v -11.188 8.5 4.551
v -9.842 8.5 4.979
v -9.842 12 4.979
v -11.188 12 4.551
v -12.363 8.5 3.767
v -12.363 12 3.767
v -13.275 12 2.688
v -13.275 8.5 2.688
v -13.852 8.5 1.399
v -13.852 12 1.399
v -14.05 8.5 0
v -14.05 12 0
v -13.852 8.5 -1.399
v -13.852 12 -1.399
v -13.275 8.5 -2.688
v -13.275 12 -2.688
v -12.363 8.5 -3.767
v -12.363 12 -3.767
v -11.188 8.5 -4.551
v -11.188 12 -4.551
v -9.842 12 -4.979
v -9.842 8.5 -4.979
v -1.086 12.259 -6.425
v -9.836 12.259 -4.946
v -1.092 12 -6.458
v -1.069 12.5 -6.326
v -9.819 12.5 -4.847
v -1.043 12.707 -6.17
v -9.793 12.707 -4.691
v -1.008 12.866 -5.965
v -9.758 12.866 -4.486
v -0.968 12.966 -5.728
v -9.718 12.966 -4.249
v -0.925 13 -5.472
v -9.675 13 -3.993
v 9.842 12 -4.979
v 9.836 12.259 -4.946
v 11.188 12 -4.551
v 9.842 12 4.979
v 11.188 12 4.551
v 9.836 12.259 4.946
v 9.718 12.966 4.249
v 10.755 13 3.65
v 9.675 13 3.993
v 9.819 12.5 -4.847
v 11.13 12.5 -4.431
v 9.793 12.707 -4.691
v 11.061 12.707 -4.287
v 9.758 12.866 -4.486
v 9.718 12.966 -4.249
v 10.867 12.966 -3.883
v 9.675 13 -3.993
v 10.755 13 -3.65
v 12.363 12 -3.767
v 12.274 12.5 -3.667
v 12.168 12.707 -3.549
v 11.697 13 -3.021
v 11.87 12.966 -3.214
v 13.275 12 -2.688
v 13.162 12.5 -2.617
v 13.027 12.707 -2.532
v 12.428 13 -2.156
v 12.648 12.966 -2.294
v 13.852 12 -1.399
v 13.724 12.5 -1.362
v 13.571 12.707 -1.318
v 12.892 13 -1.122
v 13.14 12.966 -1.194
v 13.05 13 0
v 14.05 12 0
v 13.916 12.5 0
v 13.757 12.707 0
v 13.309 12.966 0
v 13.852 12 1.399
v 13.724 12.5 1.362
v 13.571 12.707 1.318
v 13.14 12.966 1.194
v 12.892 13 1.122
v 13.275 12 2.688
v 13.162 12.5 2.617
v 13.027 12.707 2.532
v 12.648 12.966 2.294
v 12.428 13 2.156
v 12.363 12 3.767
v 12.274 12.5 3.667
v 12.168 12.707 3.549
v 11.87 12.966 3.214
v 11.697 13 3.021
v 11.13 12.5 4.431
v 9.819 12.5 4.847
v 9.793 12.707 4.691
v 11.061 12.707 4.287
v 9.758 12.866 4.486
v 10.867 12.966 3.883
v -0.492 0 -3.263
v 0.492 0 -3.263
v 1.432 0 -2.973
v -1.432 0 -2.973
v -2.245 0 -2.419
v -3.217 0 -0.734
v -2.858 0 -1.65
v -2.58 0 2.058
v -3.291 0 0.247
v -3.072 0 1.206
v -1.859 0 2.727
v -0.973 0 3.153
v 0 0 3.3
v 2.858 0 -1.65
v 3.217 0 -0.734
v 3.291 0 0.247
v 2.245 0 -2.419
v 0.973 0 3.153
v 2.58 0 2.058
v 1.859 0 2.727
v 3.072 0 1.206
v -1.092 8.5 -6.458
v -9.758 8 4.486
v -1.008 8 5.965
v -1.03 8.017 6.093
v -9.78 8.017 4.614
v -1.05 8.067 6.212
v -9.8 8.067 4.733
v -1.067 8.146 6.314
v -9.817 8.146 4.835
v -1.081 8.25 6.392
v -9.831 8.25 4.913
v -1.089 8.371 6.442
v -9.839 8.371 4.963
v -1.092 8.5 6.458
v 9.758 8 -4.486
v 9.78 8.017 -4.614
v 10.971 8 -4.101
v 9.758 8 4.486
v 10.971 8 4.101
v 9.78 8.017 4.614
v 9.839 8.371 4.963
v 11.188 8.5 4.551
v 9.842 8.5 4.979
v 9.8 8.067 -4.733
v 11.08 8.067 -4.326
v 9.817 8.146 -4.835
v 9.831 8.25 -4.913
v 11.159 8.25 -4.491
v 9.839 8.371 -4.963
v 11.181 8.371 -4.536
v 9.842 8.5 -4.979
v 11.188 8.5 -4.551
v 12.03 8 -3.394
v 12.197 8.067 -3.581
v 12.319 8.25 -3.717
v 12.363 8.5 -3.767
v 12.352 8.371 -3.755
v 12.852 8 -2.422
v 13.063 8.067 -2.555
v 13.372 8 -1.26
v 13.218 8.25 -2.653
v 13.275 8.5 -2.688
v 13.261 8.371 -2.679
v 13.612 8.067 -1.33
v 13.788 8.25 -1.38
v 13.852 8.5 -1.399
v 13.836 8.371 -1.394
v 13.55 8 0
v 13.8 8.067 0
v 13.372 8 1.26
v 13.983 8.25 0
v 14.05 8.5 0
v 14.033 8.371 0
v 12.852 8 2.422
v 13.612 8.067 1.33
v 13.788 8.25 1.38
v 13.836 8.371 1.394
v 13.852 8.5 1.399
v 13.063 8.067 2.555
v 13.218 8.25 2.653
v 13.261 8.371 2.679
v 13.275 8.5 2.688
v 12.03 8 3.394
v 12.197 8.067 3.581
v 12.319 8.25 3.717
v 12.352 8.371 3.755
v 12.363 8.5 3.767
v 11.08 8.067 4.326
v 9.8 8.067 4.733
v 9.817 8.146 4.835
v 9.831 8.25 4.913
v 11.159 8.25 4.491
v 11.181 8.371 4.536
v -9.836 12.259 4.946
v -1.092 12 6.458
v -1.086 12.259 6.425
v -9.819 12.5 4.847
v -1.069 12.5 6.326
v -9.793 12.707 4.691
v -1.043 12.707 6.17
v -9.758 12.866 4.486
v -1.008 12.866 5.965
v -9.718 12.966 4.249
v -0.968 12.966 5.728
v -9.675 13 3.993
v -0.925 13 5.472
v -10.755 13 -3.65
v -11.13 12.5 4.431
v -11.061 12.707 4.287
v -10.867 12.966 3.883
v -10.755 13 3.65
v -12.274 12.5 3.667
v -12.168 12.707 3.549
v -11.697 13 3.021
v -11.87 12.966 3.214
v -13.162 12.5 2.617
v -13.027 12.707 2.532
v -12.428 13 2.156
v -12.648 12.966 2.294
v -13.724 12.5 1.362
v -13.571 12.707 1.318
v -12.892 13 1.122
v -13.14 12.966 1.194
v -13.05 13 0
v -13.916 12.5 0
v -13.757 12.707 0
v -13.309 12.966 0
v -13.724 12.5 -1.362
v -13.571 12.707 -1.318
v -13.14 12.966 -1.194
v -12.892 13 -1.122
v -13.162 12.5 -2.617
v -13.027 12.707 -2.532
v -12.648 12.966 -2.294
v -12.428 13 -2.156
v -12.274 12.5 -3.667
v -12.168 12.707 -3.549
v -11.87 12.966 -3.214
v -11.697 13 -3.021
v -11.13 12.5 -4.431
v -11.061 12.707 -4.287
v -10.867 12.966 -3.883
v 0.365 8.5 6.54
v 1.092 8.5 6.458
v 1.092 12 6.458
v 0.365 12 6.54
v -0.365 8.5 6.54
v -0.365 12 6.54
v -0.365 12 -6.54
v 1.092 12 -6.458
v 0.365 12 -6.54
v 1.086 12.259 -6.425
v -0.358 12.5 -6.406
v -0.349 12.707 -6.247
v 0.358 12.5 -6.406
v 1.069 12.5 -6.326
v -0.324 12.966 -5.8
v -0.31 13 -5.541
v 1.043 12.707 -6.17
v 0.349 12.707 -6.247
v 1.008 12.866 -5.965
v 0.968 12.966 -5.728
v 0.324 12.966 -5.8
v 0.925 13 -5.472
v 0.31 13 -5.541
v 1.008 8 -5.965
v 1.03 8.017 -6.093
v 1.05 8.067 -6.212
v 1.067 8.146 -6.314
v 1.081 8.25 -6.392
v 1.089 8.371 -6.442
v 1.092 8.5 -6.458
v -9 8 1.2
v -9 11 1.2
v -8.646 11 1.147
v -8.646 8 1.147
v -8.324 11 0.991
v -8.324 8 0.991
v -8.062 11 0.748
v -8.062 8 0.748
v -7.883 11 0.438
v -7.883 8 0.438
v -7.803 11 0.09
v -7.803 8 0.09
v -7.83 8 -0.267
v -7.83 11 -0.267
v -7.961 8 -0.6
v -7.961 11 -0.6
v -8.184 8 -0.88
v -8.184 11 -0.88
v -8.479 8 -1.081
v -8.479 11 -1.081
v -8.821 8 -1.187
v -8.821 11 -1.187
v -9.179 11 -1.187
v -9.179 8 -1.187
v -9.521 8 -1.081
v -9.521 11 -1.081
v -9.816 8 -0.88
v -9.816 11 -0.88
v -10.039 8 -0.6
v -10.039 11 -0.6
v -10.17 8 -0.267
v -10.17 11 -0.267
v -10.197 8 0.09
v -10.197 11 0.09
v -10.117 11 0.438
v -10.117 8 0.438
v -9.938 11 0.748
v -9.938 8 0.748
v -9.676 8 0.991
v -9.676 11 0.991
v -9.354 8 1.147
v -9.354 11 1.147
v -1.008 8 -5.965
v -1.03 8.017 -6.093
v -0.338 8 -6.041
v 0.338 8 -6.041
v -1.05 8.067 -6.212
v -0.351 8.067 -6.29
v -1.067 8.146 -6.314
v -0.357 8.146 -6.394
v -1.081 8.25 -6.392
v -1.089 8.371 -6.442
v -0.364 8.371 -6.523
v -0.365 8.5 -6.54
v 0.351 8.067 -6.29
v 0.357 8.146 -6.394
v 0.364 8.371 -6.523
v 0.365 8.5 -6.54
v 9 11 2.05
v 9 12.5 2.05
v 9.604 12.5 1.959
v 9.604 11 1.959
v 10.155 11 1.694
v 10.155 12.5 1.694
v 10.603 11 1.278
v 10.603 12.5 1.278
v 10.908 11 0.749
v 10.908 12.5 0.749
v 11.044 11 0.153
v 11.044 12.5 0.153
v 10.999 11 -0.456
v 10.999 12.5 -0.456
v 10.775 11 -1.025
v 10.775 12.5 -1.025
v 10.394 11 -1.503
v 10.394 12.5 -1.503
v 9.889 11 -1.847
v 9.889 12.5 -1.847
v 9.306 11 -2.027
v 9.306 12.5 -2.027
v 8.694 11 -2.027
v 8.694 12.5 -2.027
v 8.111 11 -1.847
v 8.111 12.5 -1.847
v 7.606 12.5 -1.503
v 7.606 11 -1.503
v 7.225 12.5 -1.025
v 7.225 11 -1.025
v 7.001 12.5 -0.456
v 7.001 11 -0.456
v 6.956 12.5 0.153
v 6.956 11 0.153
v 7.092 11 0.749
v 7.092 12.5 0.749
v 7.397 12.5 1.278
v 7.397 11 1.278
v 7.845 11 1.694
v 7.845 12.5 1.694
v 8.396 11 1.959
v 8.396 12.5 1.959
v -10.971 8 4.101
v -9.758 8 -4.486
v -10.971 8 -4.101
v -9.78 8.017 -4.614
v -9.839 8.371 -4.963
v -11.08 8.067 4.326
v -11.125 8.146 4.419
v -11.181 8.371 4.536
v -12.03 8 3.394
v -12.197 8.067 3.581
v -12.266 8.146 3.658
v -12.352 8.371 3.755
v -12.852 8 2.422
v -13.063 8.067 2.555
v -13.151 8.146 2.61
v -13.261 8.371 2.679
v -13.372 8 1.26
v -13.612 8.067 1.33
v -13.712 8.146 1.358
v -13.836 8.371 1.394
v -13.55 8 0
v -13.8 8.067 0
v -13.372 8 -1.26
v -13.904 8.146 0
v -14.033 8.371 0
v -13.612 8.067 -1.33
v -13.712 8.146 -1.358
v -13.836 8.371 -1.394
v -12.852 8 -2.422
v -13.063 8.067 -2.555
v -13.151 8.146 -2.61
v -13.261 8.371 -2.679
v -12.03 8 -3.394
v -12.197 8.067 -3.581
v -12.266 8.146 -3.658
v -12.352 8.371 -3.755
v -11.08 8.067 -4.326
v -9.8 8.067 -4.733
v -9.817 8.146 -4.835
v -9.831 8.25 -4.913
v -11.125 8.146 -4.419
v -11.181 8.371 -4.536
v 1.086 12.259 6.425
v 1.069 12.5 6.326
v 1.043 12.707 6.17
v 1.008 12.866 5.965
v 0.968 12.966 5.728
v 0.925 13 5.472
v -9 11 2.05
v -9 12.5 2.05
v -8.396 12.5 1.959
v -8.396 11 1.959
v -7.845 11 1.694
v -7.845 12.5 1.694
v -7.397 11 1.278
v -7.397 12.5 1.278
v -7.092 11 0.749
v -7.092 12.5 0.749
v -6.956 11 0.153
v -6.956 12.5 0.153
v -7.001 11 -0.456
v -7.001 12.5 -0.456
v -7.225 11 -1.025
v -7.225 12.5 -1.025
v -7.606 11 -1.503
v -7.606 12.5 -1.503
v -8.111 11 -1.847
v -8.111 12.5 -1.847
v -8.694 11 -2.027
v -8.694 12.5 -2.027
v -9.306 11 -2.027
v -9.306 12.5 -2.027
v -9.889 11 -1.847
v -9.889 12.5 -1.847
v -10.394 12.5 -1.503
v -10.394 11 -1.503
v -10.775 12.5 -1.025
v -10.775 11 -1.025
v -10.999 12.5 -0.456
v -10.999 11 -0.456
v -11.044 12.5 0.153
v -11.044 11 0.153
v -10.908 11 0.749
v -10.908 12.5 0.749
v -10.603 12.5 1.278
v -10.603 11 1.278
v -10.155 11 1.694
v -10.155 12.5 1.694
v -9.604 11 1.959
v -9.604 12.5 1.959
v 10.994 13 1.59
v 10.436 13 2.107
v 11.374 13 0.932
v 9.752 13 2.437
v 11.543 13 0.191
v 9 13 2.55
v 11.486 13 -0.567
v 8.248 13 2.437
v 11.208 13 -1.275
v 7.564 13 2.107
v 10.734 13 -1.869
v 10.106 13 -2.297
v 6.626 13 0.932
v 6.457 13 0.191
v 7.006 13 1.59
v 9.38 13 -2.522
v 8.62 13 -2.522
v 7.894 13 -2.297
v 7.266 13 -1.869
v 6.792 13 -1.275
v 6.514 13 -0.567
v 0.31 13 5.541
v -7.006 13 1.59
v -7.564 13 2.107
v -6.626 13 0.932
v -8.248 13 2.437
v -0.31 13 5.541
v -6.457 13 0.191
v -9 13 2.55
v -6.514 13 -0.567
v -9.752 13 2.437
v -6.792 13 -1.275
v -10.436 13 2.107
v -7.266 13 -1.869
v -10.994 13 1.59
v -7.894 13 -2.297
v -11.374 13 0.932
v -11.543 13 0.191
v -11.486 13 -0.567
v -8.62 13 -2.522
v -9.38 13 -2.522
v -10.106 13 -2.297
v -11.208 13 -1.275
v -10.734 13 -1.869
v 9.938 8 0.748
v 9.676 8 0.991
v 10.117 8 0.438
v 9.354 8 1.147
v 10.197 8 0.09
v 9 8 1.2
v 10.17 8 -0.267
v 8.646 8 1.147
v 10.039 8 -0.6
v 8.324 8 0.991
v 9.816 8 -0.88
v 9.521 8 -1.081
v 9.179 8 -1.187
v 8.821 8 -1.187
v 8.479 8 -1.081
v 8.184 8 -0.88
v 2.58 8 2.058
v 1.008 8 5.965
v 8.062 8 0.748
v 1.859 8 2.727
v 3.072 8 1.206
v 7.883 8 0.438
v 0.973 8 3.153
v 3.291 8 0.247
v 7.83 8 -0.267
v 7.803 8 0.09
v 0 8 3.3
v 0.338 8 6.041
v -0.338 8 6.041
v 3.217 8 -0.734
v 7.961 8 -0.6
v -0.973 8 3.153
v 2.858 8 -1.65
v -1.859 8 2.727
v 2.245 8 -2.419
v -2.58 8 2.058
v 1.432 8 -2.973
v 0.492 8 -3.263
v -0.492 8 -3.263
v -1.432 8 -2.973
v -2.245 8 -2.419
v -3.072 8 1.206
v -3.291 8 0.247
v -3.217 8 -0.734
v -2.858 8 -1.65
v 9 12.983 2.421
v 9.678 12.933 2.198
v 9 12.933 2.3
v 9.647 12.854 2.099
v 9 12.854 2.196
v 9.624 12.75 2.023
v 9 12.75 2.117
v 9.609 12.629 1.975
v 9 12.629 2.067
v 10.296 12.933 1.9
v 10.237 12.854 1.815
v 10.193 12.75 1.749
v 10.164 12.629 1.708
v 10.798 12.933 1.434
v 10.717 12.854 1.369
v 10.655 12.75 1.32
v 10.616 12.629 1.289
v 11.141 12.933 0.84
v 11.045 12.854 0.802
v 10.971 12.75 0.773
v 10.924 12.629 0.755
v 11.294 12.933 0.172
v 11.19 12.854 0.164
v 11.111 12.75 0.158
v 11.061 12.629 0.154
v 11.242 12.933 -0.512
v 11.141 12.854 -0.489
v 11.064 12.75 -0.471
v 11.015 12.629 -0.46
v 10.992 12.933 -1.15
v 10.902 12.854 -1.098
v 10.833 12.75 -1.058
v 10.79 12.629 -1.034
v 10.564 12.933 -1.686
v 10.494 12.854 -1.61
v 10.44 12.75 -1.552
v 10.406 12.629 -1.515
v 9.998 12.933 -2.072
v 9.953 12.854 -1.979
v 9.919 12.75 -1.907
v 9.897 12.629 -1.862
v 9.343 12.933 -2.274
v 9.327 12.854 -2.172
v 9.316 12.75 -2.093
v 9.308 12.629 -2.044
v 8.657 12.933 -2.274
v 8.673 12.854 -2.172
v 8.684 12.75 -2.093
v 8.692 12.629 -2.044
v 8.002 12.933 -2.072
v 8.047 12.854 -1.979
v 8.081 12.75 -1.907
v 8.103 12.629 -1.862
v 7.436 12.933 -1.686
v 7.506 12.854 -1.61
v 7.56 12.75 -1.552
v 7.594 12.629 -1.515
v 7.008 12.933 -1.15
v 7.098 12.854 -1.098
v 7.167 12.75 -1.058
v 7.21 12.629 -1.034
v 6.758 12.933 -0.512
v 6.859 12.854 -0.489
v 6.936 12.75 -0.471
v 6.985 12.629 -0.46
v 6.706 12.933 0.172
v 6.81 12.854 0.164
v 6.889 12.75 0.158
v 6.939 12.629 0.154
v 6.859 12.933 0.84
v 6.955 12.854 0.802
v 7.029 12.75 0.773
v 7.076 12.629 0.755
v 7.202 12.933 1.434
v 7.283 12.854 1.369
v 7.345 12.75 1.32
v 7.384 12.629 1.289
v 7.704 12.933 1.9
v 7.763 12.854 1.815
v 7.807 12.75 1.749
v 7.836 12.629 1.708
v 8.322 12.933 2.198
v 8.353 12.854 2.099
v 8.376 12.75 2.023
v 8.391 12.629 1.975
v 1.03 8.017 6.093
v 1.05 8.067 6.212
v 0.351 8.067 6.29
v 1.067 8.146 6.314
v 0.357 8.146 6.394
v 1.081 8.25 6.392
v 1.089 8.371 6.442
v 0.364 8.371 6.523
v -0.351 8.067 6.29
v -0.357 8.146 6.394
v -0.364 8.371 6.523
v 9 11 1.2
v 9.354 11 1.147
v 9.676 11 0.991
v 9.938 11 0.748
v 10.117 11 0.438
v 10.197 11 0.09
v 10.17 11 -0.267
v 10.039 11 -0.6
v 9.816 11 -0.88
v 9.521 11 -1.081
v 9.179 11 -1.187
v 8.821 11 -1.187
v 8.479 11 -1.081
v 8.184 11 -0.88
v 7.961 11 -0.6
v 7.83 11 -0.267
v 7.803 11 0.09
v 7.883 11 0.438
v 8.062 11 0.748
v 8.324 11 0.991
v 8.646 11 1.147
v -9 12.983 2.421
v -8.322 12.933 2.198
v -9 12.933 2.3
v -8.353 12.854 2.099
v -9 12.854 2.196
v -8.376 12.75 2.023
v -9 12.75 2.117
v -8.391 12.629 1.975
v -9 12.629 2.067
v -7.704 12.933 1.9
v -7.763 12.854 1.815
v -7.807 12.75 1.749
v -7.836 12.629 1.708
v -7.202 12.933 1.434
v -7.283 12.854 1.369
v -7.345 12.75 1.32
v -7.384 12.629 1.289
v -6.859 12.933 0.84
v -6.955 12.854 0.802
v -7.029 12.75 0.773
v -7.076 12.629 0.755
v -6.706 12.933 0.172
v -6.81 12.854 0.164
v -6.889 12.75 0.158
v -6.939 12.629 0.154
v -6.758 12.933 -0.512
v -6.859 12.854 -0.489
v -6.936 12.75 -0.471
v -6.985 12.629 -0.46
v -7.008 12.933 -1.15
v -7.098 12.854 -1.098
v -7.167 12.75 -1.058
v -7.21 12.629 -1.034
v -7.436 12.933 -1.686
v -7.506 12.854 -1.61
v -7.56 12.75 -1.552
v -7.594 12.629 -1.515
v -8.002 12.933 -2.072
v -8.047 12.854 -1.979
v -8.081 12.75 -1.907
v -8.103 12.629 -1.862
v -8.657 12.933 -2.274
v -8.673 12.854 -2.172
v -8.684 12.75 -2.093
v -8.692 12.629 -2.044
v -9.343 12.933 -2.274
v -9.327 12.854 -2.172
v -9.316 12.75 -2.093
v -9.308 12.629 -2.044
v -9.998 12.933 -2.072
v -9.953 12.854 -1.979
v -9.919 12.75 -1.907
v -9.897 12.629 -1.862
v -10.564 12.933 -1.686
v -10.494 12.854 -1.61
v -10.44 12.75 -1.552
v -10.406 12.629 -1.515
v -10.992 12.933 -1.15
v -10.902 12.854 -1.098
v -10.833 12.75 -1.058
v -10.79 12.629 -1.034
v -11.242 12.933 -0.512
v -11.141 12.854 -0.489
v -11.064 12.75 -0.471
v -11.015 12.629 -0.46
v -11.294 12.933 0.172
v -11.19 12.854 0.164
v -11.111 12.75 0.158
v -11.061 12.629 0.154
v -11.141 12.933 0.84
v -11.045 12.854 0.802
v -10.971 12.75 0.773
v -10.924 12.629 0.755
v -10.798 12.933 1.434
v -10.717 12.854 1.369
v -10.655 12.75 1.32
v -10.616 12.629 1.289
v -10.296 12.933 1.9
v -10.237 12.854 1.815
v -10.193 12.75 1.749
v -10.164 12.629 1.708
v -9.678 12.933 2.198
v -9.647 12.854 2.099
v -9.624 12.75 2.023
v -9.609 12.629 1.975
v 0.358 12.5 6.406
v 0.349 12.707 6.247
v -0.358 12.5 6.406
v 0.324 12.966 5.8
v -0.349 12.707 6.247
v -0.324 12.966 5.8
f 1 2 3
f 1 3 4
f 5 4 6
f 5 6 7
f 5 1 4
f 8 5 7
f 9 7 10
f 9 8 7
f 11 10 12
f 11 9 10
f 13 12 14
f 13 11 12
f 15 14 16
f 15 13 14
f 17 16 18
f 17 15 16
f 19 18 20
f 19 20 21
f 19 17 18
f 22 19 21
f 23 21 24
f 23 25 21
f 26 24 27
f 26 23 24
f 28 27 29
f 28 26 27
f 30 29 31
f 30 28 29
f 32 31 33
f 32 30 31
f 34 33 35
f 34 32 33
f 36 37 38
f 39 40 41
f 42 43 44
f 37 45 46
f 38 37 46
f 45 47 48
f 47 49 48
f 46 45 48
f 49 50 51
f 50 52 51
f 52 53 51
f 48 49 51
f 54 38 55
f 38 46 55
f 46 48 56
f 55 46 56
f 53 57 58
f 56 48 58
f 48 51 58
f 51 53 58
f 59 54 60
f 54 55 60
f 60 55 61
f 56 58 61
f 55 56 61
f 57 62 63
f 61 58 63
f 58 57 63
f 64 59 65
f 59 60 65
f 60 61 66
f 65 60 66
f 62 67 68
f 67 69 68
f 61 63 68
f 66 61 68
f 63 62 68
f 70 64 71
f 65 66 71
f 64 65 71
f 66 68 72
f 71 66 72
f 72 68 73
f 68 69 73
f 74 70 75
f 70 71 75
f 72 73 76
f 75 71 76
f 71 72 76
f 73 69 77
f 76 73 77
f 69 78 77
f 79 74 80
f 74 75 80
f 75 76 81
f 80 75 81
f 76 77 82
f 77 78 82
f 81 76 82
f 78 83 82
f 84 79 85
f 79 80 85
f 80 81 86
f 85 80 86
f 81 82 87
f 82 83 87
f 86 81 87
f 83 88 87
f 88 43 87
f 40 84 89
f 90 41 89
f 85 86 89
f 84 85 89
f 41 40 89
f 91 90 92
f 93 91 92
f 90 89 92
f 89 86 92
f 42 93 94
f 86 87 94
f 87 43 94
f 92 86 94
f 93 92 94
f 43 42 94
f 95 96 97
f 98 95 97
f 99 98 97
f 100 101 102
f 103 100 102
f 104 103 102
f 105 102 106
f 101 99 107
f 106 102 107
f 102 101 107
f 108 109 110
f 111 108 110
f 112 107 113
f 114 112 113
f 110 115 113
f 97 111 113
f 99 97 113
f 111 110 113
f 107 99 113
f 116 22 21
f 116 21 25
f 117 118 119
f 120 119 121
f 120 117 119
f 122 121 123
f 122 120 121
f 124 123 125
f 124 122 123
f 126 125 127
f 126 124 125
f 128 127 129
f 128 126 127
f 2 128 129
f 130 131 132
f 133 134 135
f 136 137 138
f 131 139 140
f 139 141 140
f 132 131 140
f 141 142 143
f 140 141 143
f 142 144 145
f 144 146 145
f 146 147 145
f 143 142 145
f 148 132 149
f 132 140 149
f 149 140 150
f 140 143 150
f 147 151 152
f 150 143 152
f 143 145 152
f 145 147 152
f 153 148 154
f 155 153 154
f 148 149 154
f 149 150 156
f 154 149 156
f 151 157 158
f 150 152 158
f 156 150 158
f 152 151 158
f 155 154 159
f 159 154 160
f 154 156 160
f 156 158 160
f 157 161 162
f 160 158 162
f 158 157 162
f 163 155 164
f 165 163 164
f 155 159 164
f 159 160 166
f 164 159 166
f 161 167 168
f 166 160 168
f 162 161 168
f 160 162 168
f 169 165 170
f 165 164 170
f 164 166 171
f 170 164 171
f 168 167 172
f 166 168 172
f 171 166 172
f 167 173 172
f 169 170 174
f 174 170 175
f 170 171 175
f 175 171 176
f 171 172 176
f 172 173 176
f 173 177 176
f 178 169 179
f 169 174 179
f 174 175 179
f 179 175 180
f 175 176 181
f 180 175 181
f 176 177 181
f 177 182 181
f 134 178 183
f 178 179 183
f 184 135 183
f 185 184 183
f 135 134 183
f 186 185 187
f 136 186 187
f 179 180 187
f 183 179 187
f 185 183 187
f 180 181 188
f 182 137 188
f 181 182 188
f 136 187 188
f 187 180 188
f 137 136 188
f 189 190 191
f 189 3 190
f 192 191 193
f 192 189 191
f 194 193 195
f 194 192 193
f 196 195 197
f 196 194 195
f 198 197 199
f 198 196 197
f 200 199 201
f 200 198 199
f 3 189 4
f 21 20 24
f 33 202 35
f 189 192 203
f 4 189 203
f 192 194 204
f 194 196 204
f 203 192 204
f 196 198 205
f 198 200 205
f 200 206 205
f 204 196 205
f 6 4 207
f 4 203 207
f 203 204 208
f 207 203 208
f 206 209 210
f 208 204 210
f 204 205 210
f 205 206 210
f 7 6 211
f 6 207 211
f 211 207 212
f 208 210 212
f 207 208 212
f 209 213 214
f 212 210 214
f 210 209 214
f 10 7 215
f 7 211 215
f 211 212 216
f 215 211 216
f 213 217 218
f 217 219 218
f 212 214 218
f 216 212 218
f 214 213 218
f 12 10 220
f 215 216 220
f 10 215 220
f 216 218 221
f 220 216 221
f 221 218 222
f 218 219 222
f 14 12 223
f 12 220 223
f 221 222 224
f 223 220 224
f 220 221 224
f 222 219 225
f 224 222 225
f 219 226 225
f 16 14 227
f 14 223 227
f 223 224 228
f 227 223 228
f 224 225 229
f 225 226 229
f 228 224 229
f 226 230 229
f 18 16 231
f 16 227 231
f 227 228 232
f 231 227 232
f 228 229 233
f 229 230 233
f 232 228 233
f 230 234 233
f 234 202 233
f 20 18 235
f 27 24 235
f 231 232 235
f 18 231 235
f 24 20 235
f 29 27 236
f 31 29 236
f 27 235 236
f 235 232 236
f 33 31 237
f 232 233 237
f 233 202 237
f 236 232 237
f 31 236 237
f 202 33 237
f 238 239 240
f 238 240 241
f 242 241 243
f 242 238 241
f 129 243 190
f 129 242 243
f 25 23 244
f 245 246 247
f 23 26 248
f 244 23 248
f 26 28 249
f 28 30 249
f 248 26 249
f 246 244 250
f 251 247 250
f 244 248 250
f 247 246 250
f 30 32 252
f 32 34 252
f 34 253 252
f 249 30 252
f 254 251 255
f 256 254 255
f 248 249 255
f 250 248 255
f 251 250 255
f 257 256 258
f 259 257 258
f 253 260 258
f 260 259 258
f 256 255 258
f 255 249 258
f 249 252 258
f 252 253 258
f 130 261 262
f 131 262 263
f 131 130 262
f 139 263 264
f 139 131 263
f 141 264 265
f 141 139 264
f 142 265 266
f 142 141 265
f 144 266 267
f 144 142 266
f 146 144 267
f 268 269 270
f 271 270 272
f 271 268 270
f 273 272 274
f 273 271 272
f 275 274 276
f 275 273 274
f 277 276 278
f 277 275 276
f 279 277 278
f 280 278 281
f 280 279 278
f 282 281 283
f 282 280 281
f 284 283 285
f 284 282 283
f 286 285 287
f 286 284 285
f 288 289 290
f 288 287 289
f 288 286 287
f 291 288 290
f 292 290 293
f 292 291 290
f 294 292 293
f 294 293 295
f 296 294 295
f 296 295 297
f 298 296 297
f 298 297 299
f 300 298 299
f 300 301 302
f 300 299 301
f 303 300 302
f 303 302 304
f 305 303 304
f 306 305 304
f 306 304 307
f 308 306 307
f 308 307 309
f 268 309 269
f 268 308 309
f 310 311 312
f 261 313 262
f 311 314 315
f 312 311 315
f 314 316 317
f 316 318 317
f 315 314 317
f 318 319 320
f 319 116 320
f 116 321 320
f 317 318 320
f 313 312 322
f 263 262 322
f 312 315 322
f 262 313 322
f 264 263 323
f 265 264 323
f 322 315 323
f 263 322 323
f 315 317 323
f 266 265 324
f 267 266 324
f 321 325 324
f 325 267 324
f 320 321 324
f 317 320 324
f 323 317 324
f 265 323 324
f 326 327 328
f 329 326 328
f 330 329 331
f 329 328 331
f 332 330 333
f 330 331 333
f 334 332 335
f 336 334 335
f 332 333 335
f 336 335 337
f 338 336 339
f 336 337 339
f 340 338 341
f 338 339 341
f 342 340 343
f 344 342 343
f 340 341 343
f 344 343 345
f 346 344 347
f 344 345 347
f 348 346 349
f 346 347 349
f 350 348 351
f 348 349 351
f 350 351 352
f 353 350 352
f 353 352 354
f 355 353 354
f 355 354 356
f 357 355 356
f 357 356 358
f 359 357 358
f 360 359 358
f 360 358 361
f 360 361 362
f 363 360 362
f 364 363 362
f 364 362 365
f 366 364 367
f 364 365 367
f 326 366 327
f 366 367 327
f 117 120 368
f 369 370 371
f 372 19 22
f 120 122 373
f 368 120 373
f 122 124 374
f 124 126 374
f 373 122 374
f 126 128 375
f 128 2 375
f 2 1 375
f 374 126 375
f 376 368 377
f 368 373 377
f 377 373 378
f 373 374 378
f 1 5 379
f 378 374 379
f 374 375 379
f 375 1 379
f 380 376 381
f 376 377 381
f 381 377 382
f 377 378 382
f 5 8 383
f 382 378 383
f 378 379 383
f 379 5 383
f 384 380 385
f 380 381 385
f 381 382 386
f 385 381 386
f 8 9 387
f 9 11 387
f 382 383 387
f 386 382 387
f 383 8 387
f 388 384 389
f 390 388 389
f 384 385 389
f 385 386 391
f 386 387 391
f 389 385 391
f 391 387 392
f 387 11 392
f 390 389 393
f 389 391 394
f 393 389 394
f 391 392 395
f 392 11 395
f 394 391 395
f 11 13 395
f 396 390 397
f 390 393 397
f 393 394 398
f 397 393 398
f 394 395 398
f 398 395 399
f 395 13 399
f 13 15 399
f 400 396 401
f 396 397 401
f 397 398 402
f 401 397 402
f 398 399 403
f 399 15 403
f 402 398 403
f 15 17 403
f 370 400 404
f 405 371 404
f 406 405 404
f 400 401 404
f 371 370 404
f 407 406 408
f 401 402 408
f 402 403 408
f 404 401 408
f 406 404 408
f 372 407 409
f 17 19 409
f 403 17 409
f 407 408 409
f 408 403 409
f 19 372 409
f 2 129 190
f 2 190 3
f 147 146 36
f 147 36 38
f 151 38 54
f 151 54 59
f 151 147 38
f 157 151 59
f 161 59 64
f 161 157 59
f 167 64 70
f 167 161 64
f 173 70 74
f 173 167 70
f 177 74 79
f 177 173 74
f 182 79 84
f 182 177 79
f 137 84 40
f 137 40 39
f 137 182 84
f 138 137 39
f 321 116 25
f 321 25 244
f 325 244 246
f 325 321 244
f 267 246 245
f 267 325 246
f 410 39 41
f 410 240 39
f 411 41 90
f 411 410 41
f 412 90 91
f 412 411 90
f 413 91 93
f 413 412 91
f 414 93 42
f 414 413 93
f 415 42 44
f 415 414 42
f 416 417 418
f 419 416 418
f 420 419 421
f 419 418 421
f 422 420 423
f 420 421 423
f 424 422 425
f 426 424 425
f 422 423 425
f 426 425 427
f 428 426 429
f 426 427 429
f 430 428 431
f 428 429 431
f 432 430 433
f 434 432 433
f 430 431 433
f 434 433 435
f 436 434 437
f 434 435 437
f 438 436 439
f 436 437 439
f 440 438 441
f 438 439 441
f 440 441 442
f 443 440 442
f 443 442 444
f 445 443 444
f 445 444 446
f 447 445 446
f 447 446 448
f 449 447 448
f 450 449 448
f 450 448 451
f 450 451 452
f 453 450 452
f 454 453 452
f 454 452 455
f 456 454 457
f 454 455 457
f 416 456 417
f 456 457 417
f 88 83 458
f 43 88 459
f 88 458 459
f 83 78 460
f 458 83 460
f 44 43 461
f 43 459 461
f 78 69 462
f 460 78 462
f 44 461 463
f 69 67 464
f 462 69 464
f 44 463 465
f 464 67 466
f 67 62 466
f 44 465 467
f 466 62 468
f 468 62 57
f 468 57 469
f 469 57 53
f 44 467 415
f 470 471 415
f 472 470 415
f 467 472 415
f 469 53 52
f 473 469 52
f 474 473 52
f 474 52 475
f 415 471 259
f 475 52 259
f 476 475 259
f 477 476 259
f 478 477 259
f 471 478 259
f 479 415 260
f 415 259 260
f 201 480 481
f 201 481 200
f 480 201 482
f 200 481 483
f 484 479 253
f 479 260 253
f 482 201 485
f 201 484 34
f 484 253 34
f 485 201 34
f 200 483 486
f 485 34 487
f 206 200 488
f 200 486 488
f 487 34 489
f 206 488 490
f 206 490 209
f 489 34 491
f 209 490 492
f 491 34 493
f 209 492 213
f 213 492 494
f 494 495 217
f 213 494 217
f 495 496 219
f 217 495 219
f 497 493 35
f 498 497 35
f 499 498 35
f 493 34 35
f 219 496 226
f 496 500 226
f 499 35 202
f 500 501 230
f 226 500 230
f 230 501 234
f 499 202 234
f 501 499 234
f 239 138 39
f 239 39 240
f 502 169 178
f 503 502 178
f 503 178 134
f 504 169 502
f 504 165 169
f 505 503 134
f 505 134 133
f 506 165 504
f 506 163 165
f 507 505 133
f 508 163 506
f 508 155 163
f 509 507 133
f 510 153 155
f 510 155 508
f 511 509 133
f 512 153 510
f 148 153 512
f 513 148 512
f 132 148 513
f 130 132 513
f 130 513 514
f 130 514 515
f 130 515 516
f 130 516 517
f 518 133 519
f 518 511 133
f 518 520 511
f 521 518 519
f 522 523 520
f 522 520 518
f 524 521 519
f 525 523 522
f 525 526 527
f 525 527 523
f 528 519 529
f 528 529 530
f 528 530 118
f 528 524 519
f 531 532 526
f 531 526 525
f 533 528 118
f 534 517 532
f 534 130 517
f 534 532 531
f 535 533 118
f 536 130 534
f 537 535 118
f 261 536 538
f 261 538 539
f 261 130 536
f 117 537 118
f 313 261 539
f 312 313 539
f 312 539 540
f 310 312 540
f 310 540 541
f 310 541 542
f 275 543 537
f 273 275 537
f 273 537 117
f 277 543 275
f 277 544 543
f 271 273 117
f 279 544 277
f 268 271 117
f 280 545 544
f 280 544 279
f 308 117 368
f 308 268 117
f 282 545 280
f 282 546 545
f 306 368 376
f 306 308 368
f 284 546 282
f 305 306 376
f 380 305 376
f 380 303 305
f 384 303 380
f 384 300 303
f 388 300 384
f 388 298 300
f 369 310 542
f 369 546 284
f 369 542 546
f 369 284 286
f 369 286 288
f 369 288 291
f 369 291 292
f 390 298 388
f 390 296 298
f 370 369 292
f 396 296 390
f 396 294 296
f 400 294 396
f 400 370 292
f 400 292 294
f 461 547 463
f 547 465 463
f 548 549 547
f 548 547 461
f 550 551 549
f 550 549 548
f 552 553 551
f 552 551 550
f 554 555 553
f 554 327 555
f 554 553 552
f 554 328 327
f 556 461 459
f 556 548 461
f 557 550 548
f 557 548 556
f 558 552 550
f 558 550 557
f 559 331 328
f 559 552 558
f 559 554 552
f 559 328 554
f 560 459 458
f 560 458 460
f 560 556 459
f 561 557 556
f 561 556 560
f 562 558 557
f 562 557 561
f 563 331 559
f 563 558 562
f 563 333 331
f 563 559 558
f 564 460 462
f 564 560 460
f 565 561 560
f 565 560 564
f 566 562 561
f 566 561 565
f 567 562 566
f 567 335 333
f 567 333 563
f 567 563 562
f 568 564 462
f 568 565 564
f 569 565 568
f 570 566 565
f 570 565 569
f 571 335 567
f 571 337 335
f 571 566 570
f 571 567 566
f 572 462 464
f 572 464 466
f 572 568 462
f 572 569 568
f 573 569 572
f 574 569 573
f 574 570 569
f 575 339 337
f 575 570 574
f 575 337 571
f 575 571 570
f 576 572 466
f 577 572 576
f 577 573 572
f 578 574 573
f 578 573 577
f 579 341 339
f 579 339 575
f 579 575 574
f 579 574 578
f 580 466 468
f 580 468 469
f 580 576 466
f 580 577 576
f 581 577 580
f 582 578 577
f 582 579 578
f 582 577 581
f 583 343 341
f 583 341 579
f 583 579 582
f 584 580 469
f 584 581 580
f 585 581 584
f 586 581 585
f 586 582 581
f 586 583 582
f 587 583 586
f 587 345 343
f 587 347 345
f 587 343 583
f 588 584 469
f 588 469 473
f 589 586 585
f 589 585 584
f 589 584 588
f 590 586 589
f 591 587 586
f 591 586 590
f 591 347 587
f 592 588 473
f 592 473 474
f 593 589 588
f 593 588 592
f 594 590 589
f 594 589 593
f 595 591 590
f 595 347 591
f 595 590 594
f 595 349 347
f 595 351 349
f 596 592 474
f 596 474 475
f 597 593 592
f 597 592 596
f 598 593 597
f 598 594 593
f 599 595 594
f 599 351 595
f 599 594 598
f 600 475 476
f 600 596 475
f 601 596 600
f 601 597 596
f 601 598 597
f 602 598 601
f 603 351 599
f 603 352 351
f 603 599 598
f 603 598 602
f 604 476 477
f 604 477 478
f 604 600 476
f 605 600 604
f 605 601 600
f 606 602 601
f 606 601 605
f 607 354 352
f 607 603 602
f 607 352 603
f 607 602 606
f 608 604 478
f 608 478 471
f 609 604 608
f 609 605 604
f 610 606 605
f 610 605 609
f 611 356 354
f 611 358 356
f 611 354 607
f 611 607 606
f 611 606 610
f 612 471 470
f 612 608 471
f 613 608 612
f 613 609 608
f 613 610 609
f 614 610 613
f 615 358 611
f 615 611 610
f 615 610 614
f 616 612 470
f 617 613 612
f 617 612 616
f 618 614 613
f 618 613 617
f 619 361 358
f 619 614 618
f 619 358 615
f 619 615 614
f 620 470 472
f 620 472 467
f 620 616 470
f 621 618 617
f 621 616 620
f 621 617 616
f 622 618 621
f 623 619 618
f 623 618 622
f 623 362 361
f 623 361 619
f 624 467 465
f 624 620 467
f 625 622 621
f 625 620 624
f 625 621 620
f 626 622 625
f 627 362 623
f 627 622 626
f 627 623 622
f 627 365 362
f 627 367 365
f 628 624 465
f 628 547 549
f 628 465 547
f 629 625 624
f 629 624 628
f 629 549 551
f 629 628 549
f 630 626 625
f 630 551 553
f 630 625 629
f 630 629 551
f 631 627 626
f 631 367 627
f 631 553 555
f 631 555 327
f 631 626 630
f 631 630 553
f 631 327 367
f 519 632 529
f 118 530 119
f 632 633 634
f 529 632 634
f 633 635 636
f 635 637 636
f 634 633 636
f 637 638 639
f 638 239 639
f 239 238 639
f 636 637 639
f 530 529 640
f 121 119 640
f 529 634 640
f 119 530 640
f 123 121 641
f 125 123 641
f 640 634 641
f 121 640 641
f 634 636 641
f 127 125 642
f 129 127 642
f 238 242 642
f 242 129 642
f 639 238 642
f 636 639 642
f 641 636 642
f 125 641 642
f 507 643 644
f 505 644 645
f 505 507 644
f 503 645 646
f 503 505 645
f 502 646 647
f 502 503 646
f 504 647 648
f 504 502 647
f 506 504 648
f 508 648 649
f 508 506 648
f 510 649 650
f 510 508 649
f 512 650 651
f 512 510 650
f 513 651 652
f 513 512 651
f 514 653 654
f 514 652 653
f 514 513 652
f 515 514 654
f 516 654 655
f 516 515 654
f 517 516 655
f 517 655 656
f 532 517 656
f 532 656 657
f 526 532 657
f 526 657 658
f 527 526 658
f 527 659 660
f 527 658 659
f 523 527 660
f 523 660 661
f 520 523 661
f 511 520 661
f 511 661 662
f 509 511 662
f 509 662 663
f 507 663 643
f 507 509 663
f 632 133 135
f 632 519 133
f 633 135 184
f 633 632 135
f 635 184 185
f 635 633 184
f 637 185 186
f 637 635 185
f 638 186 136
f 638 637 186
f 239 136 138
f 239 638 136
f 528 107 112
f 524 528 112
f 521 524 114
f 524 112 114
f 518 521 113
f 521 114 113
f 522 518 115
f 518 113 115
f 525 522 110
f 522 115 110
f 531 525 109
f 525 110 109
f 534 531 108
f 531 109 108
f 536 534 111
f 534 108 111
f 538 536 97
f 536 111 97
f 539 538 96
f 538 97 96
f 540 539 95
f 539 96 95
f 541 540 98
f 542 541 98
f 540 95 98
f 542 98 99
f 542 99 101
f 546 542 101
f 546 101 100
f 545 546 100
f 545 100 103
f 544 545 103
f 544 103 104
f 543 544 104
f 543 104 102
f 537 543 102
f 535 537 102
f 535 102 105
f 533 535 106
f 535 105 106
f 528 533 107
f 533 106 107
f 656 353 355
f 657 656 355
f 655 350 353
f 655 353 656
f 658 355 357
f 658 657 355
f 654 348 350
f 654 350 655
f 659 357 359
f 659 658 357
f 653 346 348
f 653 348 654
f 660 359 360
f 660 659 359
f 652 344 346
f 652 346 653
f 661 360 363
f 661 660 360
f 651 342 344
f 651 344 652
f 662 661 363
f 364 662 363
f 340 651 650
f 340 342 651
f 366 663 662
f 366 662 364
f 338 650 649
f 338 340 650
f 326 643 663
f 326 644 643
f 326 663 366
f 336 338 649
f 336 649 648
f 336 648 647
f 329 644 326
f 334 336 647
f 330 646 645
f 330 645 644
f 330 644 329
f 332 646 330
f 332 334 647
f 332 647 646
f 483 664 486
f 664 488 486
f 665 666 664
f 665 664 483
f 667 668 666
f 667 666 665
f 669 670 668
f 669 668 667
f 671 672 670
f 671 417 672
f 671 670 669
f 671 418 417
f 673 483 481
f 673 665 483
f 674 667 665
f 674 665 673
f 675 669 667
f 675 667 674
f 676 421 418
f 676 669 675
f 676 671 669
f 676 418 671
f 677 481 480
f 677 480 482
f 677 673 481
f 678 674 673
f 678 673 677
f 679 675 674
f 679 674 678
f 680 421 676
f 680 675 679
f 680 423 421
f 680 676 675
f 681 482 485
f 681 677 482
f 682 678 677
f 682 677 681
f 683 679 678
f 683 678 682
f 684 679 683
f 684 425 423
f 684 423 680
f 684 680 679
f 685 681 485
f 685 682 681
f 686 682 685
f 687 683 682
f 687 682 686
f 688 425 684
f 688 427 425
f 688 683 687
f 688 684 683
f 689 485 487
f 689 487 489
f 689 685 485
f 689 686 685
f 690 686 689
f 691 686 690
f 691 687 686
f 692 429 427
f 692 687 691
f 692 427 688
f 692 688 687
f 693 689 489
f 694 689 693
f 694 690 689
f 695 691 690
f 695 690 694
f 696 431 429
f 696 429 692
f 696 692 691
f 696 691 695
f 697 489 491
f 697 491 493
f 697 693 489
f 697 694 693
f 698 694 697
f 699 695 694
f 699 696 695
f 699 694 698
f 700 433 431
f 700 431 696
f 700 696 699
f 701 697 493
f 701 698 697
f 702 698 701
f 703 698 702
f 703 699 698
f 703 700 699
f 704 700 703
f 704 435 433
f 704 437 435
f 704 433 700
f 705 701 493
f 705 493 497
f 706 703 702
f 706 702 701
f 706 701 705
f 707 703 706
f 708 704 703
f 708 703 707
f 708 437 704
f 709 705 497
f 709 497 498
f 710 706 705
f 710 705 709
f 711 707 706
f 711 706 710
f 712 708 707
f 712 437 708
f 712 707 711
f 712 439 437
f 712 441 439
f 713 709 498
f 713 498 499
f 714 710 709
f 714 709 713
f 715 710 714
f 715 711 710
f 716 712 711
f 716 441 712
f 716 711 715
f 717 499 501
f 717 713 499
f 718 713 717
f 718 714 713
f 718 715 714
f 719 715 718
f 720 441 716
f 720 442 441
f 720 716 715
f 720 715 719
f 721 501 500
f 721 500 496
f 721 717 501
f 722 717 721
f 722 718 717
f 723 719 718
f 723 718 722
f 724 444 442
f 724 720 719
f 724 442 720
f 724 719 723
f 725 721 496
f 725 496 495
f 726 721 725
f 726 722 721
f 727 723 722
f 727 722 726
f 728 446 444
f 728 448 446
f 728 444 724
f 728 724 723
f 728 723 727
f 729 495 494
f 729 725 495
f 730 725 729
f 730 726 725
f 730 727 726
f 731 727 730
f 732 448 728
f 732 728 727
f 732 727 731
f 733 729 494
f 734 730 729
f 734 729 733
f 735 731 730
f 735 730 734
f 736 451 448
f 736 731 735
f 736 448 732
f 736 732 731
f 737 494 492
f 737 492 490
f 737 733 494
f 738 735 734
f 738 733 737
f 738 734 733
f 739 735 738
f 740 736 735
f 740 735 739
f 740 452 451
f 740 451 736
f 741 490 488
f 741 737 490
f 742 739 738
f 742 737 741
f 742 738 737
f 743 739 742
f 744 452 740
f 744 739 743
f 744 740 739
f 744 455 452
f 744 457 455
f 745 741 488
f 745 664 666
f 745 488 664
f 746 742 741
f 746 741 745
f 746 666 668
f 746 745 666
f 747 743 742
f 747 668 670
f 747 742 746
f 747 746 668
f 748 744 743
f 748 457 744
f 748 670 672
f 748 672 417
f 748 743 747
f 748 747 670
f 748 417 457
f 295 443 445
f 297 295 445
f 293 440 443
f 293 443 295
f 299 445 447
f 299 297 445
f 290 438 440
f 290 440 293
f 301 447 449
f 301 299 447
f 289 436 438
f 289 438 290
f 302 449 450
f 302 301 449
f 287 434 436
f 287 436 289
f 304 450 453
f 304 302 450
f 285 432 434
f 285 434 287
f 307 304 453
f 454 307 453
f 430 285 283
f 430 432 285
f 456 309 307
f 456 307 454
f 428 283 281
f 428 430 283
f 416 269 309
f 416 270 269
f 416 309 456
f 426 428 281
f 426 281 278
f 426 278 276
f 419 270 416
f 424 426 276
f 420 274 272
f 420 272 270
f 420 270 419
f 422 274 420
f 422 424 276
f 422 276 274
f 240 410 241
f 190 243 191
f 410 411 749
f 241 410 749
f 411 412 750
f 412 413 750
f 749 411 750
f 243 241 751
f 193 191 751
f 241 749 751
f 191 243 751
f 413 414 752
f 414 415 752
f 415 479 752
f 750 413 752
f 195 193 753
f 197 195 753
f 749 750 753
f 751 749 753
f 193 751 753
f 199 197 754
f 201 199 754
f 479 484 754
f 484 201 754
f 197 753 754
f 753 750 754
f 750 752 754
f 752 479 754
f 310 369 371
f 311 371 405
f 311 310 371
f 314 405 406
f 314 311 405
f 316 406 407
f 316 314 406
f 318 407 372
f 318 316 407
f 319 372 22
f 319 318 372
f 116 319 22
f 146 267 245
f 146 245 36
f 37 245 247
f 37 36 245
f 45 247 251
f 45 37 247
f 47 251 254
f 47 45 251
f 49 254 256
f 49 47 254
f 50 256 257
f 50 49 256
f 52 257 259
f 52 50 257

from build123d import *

# Parameters (mm, degrees)
SKETCH1_R           = 3.3
BOSS_EXTRUDE1_DEPTH = 8
SKETCH2_R           = 1.2
BOSS_EXTRUDE2_DEPTH = 5
SKETCH3_R           = 2.05
CUT_EXTRUDE1_DEPTH  = 2
FILLET1_R           = 0.5
FILLET2_R           = 1


with BuildPart() as part:
    # Sketch1 → Boss-Extrude1 (new body)
    with BuildSketch(Plane(origin=(0, 0, 0), x_dir=(1, 0, 0), z_dir=(0, 1, 0))):
        with Locations(Location((0, 0, 0), (0, 0, 270))):
            Circle(SKETCH1_R)
    extrude(amount=BOSS_EXTRUDE1_DEPTH)

    # Sketch2 → Boss-Extrude2 (add)
    with BuildSketch(Plane(origin=(0, 8, 0), x_dir=(1, 0, 0), z_dir=(0, 1, 0))):
        with BuildLine():
            Line((-9.841666667, 4.979367151), (-1.091666667, 6.458387097))
            ThreePointArc((-1.091666667, 6.458387097), (0, 6.55), (1.091666667, 6.458387097))
            Line((1.091666667, 6.458387097), (9.841666667, 4.979367151))
            ThreePointArc((9.841666667, 4.979367151), (14.05, 0), (9.841666667, -4.979367151))
            Line((9.841666667, -4.979367151), (1.091666667, -6.458387097))
            ThreePointArc((1.091666667, -6.458387097), (0, -6.55), (-1.091666667, -6.458387097))
            Line((-1.091666667, -6.458387097), (-9.841666667, -4.979367151))
            ThreePointArc((-9.841666667, -4.979367151), (-14.05, 0), (-9.841666667, 4.979367151))
        make_face()
        with Locations(Location((-9, 0, 0), (0, 0, 270))):
            Circle(SKETCH2_R, mode=Mode.SUBTRACT)
        with Locations(Location((9, 0, 0), (0, 0, 270))):
            Circle(SKETCH2_R, mode=Mode.SUBTRACT)
    extrude(amount=BOSS_EXTRUDE2_DEPTH)

    # Sketch3 → Cut-Extrude1 (cut)
    with BuildSketch(Plane(origin=(0, 13, 0), x_dir=(1, 0, 0), z_dir=(0, 1, 0))):
        with Locations(Location((-9, 0, 0), (0, 0, 270))):
            Circle(SKETCH3_R)
        with Locations(Location((9, 0, 0), (0, 0, 270))):
            Circle(SKETCH3_R)
    extrude(amount=-CUT_EXTRUDE1_DEPTH, mode=Mode.SUBTRACT)

    # Fillet1
    fillet1_edges = [part.edges().sort_by_distance(p)[0] for p in [
        (5.466666667, 8, 5.718877124),
        (14.05, 8, 0),
        (5.466666667, 8, -5.718877124),
        (0, 8, -6.55),
        (-5.466666667, 8, -5.718877124),
        (-9, 13, -2.05),
        (9, 13, -2.05),
        (-14.05, 8, 0),
        (-5.466666667, 8, 5.718877124),
        (0, 8, 6.55),
    ]]
    fillet(fillet1_edges, radius=FILLET1_R)

    # Fillet2
    fillet2_edges = [part.edges().sort_by_distance(p)[0] for p in [
        (-14.05, 13, 0),
        (-5.466666667, 13, 5.718877124),
        (0, 13, 6.55),
        (5.466666667, 13, 5.718877124),
        (14.05, 13, 0),
        (5.466666667, 13, -5.718877124),
        (0, 13, -6.55),
        (-5.466666667, 13, -5.718877124),
    ]]
    fillet(fillet2_edges, radius=FILLET2_R)


solid = part.part
